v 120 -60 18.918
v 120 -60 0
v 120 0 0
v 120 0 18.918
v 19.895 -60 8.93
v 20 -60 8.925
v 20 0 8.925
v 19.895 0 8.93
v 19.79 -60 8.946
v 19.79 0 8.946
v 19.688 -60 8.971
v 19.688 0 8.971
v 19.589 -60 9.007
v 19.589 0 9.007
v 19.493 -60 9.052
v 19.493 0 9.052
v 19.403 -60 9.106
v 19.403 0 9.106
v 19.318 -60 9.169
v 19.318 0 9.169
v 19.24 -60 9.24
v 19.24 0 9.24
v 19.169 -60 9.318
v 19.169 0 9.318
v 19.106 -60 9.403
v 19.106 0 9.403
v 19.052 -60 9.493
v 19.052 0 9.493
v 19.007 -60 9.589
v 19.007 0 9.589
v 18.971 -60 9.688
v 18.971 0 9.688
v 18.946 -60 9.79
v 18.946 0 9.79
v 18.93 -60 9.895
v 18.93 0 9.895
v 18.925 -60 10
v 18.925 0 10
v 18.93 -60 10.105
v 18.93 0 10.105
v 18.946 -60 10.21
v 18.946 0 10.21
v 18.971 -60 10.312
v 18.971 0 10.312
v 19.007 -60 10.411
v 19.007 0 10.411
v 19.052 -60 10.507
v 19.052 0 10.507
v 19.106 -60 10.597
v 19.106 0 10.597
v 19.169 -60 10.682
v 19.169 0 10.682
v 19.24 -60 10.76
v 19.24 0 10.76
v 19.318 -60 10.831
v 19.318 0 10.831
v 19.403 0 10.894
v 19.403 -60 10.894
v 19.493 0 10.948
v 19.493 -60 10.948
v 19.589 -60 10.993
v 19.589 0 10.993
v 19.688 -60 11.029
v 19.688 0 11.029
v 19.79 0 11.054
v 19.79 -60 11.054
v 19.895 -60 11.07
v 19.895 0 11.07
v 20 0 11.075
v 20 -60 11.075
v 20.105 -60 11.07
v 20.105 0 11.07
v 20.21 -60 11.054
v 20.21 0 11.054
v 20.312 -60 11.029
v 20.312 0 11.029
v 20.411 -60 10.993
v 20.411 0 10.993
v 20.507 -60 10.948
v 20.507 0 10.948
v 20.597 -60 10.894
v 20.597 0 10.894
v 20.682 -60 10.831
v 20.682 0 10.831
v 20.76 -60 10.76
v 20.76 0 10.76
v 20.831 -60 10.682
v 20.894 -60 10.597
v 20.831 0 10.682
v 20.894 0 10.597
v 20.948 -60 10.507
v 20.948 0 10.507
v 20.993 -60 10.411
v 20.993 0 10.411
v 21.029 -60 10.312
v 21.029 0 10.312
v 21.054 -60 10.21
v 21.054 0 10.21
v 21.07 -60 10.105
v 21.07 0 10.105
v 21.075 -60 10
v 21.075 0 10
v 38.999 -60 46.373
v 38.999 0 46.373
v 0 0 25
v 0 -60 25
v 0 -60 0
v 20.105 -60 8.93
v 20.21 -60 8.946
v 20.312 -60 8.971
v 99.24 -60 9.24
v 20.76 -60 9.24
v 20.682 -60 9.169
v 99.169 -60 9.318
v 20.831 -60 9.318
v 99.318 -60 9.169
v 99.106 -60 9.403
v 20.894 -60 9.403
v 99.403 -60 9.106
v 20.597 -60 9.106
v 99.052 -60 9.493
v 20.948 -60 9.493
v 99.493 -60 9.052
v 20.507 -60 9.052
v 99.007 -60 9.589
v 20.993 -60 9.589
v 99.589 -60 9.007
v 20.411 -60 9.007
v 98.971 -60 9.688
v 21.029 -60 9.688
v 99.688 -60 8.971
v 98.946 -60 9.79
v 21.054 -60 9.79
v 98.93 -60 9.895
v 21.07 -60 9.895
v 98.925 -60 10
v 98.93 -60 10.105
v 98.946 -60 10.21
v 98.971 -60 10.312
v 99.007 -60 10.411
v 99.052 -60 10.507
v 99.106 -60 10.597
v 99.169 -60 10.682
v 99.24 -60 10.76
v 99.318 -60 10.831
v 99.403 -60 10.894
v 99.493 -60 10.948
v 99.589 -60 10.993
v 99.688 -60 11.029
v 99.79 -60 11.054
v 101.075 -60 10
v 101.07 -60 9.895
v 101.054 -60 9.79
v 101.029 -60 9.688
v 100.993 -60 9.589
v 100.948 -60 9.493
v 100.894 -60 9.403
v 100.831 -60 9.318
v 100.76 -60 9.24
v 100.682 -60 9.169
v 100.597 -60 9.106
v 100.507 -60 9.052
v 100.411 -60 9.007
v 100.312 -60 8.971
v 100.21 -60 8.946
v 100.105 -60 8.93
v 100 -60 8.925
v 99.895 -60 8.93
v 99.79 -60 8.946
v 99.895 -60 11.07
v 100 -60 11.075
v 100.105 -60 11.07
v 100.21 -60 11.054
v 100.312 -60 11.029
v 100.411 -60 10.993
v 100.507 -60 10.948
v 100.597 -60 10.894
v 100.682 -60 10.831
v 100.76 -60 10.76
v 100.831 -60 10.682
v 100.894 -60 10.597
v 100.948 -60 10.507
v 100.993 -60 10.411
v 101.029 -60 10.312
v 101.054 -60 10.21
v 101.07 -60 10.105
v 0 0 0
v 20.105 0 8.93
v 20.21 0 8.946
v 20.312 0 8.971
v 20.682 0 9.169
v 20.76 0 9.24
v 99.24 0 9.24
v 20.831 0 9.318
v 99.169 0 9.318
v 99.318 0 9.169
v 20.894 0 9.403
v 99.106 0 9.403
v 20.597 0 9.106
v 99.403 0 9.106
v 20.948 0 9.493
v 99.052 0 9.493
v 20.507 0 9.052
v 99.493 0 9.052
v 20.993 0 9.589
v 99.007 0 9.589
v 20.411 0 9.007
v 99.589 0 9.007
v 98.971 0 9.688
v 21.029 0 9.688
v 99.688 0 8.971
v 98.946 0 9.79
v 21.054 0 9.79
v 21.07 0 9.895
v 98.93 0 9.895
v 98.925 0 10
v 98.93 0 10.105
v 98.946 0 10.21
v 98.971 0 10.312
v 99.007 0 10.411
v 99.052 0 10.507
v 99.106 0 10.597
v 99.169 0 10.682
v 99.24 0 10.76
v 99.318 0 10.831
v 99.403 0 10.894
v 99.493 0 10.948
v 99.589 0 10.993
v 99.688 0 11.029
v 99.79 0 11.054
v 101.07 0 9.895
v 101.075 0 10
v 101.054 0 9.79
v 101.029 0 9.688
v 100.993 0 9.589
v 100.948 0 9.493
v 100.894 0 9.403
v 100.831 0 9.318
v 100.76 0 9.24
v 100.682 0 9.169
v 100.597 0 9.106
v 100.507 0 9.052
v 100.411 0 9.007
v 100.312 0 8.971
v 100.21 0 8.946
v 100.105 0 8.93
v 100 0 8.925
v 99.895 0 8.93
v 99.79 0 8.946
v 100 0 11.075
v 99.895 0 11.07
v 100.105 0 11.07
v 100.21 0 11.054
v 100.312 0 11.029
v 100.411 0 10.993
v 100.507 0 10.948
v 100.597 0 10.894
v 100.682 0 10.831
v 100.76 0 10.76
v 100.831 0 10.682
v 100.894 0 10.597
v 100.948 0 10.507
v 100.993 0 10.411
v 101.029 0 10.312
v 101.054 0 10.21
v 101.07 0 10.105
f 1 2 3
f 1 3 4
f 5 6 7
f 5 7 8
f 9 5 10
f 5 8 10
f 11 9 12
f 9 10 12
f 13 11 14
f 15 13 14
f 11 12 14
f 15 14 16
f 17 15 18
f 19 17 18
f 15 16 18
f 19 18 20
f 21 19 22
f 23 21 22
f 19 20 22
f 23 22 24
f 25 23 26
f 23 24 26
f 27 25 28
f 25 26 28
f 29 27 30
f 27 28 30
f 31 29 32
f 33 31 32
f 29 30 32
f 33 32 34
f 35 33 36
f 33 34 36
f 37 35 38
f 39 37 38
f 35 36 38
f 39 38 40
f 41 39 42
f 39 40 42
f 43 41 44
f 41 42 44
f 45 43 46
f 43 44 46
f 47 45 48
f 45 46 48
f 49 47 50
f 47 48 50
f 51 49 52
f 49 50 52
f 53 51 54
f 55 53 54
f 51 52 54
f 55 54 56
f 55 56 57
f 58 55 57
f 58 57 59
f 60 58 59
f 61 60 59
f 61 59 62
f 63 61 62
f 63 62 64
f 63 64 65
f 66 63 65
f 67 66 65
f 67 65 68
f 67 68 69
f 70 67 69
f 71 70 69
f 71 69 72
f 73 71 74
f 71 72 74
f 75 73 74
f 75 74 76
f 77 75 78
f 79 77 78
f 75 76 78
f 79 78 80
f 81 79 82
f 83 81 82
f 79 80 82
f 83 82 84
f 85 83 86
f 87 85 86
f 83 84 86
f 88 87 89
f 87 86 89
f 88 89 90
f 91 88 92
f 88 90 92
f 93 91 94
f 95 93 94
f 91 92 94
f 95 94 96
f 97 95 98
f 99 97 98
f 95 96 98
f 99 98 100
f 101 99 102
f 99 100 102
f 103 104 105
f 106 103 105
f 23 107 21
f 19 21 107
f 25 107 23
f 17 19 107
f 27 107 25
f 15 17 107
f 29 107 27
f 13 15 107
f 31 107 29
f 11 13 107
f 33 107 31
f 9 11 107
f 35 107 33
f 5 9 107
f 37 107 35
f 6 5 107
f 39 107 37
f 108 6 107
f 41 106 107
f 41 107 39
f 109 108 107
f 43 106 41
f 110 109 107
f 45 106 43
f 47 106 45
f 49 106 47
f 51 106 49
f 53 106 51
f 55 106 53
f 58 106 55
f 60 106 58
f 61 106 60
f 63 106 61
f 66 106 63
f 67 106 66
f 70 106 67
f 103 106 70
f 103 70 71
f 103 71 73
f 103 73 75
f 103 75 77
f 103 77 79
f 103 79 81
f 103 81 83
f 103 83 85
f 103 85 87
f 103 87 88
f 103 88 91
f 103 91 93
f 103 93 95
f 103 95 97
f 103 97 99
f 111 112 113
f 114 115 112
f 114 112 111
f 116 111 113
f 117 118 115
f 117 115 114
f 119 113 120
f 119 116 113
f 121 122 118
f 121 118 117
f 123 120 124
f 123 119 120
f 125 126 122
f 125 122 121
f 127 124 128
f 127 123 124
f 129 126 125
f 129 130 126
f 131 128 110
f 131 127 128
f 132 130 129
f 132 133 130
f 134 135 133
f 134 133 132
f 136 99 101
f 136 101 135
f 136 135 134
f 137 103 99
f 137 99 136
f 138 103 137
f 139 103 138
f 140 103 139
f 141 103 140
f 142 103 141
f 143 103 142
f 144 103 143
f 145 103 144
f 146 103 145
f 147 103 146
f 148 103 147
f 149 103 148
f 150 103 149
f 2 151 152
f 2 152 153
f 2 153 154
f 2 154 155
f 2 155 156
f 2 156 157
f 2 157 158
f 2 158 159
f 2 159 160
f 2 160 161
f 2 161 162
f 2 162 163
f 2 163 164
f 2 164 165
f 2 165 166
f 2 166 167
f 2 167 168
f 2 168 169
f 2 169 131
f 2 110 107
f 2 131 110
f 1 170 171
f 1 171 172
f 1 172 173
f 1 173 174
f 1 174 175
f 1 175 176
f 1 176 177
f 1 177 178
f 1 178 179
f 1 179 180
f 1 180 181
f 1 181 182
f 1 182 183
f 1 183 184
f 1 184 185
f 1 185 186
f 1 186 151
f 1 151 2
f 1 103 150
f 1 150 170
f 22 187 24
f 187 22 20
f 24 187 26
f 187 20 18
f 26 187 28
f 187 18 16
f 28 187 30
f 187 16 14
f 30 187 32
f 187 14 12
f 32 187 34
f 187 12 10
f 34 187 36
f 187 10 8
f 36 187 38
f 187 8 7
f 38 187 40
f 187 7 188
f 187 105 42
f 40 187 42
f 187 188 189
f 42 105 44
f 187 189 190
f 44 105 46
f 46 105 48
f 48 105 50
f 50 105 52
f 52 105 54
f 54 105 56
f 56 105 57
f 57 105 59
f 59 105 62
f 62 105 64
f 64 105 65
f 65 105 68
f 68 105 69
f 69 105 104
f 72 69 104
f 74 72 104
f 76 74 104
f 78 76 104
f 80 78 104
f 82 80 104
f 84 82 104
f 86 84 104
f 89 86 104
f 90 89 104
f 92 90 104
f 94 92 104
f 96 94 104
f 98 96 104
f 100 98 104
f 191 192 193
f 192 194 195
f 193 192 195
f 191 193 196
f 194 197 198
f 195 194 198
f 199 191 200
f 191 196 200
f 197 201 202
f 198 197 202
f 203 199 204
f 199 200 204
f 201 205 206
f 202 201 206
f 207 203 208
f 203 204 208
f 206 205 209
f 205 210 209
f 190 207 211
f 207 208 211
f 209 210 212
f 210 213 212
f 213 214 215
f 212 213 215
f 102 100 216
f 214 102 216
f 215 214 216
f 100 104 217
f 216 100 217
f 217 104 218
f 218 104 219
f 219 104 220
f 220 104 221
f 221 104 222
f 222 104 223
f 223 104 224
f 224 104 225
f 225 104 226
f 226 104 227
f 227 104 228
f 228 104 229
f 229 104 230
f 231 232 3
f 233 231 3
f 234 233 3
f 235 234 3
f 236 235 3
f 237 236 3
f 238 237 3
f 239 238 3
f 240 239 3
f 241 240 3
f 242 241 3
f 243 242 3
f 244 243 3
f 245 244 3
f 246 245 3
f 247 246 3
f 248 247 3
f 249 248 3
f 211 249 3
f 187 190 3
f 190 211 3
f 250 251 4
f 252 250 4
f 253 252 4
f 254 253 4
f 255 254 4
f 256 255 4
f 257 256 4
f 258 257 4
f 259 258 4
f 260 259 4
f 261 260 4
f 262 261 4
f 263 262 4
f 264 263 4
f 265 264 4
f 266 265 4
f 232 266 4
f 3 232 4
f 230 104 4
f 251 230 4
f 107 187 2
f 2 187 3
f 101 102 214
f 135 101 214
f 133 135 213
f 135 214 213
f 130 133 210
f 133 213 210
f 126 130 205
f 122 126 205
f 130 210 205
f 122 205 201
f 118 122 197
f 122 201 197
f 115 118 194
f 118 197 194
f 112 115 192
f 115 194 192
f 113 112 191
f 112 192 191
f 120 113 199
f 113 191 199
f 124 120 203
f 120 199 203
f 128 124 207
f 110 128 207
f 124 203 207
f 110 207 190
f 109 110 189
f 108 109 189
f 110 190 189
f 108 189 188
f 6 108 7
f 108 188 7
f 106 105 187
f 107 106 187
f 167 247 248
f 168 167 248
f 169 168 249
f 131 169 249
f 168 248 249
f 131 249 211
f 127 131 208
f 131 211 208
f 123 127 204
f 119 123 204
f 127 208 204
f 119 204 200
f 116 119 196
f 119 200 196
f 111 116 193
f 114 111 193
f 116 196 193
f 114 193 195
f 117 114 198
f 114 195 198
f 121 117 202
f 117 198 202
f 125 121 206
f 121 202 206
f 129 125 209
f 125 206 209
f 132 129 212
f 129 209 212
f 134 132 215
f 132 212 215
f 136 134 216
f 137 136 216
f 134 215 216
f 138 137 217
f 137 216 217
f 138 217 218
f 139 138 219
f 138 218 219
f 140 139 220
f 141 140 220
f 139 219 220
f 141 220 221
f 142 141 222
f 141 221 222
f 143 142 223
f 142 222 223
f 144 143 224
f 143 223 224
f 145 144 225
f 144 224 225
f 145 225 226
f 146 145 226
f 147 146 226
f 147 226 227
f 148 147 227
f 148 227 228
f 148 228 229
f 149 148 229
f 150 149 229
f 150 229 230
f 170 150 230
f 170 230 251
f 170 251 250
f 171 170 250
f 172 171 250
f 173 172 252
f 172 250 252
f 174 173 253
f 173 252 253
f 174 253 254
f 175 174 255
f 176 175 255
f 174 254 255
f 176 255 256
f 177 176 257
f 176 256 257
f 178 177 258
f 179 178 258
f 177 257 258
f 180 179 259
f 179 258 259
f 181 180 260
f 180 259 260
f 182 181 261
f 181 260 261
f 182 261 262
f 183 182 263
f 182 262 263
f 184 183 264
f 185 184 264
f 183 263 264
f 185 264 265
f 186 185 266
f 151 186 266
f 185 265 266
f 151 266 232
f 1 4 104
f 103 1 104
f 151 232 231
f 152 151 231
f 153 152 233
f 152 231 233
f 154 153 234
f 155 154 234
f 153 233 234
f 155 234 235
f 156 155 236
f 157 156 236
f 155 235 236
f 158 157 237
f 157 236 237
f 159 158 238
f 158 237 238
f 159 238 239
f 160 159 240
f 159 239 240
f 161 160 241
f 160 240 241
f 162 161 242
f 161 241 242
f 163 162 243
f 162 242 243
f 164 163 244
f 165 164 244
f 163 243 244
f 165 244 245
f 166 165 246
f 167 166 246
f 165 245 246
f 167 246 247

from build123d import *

# Parameters (mm, degrees)
F1_DEPTH = 60


with BuildPart() as f1:
    # F0 (on Front) → F1 (new body)
    with BuildSketch(Plane.XZ):
        Polygon((0, 25), (0, 0), (20, 0), (100, 0), (120, 0), (120, 18.918289), (38.999476, 46.372868), align=None)
        with BuildLine():
            ThreePointArc((21.075, 10), (20.76014, 9.23986), (20, 8.925))
            ThreePointArc((20, 8.925), (19.23986, 10.76014), (21.075, 10))
        make_face(mode=Mode.SUBTRACT)
        with BuildLine():
            ThreePointArc((101.075, 10), (100.76014, 9.23986), (100, 8.925))
            ThreePointArc((100, 8.925), (99.23986, 10.76014), (101.075, 10))
        make_face(mode=Mode.SUBTRACT)
    extrude(amount=F1_DEPTH)


solid = f1.part
